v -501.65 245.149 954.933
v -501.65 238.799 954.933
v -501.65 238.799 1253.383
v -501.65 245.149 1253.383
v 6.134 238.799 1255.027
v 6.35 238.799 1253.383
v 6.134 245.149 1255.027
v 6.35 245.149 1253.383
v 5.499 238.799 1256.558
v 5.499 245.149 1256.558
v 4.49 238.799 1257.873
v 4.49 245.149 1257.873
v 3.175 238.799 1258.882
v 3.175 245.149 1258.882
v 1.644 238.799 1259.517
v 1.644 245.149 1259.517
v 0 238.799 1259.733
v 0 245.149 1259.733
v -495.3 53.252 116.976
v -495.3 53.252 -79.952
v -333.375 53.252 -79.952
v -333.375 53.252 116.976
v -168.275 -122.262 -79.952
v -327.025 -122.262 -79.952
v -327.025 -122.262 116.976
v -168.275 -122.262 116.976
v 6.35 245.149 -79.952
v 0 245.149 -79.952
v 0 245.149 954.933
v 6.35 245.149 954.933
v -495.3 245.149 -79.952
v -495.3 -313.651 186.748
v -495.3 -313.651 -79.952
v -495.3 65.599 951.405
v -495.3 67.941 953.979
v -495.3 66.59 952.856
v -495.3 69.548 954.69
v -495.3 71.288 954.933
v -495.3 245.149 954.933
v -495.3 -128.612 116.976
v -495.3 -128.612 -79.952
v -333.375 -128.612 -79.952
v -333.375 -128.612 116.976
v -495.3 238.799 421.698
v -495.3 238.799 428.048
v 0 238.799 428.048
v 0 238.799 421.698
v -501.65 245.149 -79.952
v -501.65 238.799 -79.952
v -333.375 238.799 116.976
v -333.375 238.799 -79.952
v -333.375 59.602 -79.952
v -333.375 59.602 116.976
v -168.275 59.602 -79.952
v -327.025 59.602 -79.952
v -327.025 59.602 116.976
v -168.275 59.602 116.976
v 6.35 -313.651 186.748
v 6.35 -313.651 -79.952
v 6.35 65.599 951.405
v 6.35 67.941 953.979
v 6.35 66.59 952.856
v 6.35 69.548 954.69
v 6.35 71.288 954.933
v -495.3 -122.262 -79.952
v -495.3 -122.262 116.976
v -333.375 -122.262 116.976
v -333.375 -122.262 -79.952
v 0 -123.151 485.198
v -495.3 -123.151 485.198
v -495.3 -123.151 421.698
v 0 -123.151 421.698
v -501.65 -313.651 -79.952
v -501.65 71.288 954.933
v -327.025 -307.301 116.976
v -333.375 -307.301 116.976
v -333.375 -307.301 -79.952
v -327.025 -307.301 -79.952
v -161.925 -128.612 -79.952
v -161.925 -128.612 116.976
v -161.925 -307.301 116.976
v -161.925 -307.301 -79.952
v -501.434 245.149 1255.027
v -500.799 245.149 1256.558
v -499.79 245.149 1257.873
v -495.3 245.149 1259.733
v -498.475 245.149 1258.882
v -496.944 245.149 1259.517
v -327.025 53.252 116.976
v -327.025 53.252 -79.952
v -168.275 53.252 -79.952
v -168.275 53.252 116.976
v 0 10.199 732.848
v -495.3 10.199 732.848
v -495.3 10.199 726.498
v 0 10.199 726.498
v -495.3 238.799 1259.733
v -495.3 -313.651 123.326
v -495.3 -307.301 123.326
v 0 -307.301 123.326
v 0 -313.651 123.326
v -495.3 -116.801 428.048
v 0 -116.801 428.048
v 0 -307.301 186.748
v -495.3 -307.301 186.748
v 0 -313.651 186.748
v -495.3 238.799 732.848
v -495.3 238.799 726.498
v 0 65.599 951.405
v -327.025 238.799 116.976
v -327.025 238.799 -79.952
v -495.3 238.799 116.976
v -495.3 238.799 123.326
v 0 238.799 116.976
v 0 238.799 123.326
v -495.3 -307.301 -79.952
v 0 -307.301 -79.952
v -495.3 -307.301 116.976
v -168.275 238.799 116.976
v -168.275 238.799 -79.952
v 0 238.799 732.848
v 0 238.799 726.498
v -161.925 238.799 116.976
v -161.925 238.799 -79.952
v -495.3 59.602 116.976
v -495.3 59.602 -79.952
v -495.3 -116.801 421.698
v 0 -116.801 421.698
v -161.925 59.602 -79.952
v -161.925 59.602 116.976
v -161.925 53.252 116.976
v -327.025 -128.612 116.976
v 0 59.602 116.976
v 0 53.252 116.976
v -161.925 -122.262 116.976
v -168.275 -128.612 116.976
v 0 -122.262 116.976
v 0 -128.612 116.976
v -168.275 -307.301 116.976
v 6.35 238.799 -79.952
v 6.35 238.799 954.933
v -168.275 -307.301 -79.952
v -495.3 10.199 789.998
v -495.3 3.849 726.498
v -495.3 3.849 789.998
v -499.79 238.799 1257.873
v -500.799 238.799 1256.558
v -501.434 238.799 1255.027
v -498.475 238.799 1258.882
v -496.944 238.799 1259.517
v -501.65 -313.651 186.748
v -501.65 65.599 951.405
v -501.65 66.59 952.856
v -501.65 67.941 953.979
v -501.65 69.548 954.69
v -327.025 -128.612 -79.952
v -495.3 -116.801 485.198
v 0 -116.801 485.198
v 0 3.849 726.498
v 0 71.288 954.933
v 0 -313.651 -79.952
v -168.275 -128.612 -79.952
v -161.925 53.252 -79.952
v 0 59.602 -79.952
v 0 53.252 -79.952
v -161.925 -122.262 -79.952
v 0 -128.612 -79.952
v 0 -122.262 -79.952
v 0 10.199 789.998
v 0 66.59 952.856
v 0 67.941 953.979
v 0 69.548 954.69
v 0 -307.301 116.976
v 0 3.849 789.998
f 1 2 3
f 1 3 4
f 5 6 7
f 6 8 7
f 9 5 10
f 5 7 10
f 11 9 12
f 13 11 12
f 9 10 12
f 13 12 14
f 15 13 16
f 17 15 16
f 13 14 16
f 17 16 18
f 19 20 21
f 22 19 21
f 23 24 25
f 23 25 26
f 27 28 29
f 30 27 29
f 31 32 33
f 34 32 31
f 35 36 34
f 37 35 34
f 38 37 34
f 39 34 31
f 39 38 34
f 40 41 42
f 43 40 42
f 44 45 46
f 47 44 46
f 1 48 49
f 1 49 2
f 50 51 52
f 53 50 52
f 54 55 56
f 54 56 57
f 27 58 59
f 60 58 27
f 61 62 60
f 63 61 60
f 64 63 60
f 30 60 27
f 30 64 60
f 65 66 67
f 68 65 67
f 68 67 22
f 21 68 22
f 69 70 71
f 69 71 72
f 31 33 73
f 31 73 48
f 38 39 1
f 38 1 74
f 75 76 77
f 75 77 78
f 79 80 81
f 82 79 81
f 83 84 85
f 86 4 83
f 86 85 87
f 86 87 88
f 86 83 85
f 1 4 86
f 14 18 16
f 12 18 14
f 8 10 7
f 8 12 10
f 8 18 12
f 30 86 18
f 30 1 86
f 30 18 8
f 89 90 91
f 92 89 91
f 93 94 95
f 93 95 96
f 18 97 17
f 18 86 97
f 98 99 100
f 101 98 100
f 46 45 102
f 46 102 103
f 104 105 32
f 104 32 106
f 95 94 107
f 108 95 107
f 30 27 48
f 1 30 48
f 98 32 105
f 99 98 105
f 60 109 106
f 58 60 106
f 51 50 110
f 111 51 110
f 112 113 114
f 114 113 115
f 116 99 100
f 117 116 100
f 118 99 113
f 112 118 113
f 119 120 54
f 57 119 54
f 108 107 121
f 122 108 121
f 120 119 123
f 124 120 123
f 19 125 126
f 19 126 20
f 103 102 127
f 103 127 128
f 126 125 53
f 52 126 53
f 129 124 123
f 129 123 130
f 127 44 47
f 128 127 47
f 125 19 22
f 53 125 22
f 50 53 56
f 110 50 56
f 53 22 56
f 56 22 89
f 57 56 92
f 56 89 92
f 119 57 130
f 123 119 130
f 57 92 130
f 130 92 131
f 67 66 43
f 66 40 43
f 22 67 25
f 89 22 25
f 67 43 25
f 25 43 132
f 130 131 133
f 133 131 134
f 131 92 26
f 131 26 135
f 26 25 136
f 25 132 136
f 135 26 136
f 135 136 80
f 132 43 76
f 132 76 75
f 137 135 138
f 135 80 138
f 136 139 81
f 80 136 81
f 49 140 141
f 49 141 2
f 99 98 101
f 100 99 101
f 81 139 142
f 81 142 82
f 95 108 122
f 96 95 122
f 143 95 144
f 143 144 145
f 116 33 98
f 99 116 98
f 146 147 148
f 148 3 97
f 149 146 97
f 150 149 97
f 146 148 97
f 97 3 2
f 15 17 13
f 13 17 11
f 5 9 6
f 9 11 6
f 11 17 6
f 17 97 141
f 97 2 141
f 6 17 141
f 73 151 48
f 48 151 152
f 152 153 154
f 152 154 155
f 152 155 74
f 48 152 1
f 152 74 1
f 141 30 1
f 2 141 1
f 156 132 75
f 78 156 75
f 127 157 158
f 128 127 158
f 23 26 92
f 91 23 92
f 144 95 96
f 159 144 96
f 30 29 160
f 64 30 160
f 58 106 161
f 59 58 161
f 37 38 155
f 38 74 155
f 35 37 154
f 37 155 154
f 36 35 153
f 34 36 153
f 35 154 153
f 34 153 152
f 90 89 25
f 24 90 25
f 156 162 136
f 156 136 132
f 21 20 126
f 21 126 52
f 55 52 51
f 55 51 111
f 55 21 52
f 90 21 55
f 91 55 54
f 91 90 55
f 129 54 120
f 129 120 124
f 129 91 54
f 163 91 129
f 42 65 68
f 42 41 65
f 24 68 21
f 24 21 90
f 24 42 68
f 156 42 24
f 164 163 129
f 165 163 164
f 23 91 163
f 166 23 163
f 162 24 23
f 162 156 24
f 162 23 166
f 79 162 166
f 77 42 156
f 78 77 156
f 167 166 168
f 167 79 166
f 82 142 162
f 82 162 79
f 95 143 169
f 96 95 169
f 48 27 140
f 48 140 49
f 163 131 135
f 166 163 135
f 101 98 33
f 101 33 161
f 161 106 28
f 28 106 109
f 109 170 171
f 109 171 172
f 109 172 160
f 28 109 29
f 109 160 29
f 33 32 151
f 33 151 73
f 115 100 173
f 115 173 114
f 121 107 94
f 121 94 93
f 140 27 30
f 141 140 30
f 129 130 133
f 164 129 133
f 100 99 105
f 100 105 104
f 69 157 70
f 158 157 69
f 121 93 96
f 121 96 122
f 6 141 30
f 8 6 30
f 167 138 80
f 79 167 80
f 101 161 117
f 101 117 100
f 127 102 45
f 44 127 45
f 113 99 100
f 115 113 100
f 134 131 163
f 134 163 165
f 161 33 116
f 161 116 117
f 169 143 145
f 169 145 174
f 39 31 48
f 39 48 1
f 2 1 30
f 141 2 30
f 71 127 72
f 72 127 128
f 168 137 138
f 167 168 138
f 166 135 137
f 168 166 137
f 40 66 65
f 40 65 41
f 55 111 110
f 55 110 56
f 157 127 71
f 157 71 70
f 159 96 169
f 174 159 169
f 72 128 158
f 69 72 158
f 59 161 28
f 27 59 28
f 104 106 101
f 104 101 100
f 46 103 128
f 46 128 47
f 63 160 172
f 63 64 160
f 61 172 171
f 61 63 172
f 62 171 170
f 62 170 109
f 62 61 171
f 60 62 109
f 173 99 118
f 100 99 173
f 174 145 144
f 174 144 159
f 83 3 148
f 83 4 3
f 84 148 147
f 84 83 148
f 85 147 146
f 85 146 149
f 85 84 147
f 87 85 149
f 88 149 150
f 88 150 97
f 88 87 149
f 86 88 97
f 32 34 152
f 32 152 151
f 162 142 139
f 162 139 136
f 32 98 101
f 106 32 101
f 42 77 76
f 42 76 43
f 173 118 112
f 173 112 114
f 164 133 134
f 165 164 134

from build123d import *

# Parameters (mm, degrees)
F1_DEPTH  = 6.35
F2_W      = 508
F2_H      = 1034.8848681509
F3_DEPTH  = 6.35
F7_W      = 495.3
F7_H      = 203.2776648521
F8_DEPTH  = 6.35
F9_W      = 495.3
F9_H      = 546.1
F10_DEPTH = 6.35
F12_W     = 495.3
F12_H     = 355.6
F13_DEPTH = 6.35
F14_W     = 495.3
F14_H     = 63.5
F15_DEPTH = 6.35
F17_W     = 495.3
F17_H     = 228.6
F18_DEPTH = 6.35
F19_W     = 495.3
F19_H     = 63.5
F20_DEPTH = 6.35
F21_W     = 508
F21_H     = 6.35
F22_DEPTH = 304.8
F23_R     = 6.35
F24_W     = 161.925
F24_H     = 6.35
F24_W_2   = 6.35
F24_H_2   = 178.689
F24_W_3   = 158.75
F24_H_3   = 175.514
F24_H_4   = 179.197
F25_DEPTH = 196.9276648521
F26_W     = 495.3
F26_H     = 6.35
F27_DEPTH = 63.4223351
F28_R     = 6.35
F28_2_R   = 6.35


# Not quite as in the source:
# - an extrude ends at something that could not be found from the text; its depth is read off the source's solid


with BuildPart() as f1:
    # F0 (on Right) → F1 (new body)
    with BuildSketch(Plane.YZ):
        Polygon((-313.6506947781, 123.2482513189), (-313.6506947781, -79.9517486811), (245.1493052219, -79.9517486811), (245.1493052219, 954.9331194699), (67.3493052219, 954.9331194699), (-313.6506947781, 186.7482513189), align=None)
    extrude(amount=F1_DEPTH)


with BuildPart() as f3:
    # F2 (on face) → F3 (new body)
    with BuildSketch(Plane(origin=(0, 245.1493052219, 0), x_dir=(-1, 0, 0), z_dir=(0, 1, 0))):
        with Locations((247.65, 437.4906853944)):
            Rectangle(F2_W, F2_H)
    extrude(amount=-F3_DEPTH)


with BuildPart() as f6_1:
    # F6: instance of F1
    add(f1.part.mirror(Plane.YZ.offset(-247.65)))

    # F28#2
    f28_2_edges = [f6_1.edges().sort_by_distance(p)[0] for p in [
        (-498.475, 67.349305, 954.933119),
    ]]
    fillet(f28_2_edges, radius=F28_2_R)


with BuildPart() as f8:
    # F7 (on face) → F8 (new body)
    with BuildSketch(Plane.XZ.offset(313.6506947781)):
        with Locations((-247.65, 21.687083745)):
            Rectangle(F7_W, F7_H)
    extrude(amount=-F8_DEPTH)


with BuildPart() as f10:
    # F9 (on face) → F10 (new body)
    with BuildSketch(Plane.XY.offset(123.3259161711)):
        with Locations((-247.65, -34.2506947781)):
            Rectangle(F9_W, F9_H)
    extrude(amount=-F10_DEPTH)


with BuildPart() as f13:
    # F12 (on plane+point) → F13 (new body)
    with BuildSketch(Plane.XY.offset(428.0482513189)):
        with Locations((-247.65, 60.9993052219)):
            Rectangle(F12_W, F12_H)
    extrude(amount=-F13_DEPTH)


with BuildPart() as f15:
    # F14 (on face) → F15 (new body)
    with BuildSketch(Plane.XZ.offset(116.8006947781)):
        with Locations((-247.65, 453.4482513189)):
            Rectangle(F14_W, F14_H)
    extrude(amount=F15_DEPTH)


with BuildPart() as f18:
    # F17 (on plane+point) → F18 (new body)
    with BuildSketch(Plane.XY.offset(732.8482513189)):
        with Locations((-247.65, 124.4993052219)):
            Rectangle(F17_W, F17_H)
    extrude(amount=-F18_DEPTH)


with BuildPart() as f20:
    # F19 (on face) → F20 (new body)
    with BuildSketch(Plane.XZ.offset(-10.1993052219)):
        with Locations((-247.65, 758.2482513189)):
            Rectangle(F19_W, F19_H)
    extrude(amount=F20_DEPTH)


with BuildPart() as f22:
    # F21 (on face) → F22 (new body)
    with BuildSketch(Plane.XY.offset(954.9331194699)):
        with Locations((-247.65, 241.9743052219)):
            Rectangle(F21_W, F21_H)
    extrude(amount=F22_DEPTH)

    # F23
    f23_edges = [f22.edges().sort_by_distance(p)[0] for p in [
        (6.35, 241.974305, 1259.733119),
        (-501.65, 241.974305, 1259.733119),
    ]]
    fillet(f23_edges, radius=F23_R)


with BuildPart() as f25:
    # F24 (on face) → F25 (new body, through all)
    with BuildSketch(Plane(origin=(0, 0, 116.9759161711), x_dir=(1, 0, 0), z_dir=(0, 0, -1))):
        with Locations((-80.9625, 125.4366947781)):
            Rectangle(F24_W, F24_H)
        with Locations((-165.1, 125.4366947781)):
            Rectangle(F24_W_2, F24_H)
        with Locations((-165.1, 217.9561947781)):
            Rectangle(F24_W_2, F24_H_2)
        with Locations((-247.65, 125.4366947781)):
            Rectangle(F24_W_3, F24_H)
        with Locations((-165.1, 34.5046947781)):
            Rectangle(F24_W_2, F24_H_3)
        with Locations((-330.2, 125.4366947781)):
            Rectangle(F24_W_2, F24_H)
        with Locations((-330.2, 217.9561947781)):
            Rectangle(F24_W_2, F24_H_2)
        with Locations((-165.1, -56.4273052219)):
            Rectangle(F24_W_2, F24_H)
        with Locations((-80.9625, -56.4273052219)):
            Rectangle(F24_W, F24_H)
        with Locations((-414.3375, 125.4366947781)):
            Rectangle(F24_W, F24_H)
        with Locations((-330.2, 34.5046947781)):
            Rectangle(F24_W_2, F24_H_3)
        with Locations((-247.65, -56.4273052219)):
            Rectangle(F24_W_3, F24_H)
        with Locations((-165.1, -149.2008052219)):
            Rectangle(F24_W_2, F24_H_4)
        with Locations((-330.2, -56.4273052219)):
            Rectangle(F24_W_2, F24_H)
        with Locations((-414.3375, -56.4273052219)):
            Rectangle(F24_W, F24_H)
        with Locations((-330.2, -149.2008052219)):
            Rectangle(F24_W_2, F24_H_4)
    extrude(amount=F25_DEPTH)


with BuildPart() as f27:
    # F26 (on face) → F27 (new body, through all)
    with BuildSketch(Plane.XY.offset(123.3259161711)):
        with Locations((-247.65, -310.4756947781)):
            Rectangle(F26_W, F26_H)
    extrude(amount=F27_DEPTH)


with BuildPart() as f1_1:
    add(f1.part)

    # F28
    f28_edges = [f1_1.edges().sort_by_distance(p)[0] for p in [
        (3.175, 67.349305, 954.933119),
    ]]
    fillet(f28_edges, radius=F28_R)


solid = Compound([f3.part, f6_1.part, f8.part, f10.part, f13.part, f15.part, f18.part, f20.part, f22.part, f25.part, f27.part, f1_1.part])
